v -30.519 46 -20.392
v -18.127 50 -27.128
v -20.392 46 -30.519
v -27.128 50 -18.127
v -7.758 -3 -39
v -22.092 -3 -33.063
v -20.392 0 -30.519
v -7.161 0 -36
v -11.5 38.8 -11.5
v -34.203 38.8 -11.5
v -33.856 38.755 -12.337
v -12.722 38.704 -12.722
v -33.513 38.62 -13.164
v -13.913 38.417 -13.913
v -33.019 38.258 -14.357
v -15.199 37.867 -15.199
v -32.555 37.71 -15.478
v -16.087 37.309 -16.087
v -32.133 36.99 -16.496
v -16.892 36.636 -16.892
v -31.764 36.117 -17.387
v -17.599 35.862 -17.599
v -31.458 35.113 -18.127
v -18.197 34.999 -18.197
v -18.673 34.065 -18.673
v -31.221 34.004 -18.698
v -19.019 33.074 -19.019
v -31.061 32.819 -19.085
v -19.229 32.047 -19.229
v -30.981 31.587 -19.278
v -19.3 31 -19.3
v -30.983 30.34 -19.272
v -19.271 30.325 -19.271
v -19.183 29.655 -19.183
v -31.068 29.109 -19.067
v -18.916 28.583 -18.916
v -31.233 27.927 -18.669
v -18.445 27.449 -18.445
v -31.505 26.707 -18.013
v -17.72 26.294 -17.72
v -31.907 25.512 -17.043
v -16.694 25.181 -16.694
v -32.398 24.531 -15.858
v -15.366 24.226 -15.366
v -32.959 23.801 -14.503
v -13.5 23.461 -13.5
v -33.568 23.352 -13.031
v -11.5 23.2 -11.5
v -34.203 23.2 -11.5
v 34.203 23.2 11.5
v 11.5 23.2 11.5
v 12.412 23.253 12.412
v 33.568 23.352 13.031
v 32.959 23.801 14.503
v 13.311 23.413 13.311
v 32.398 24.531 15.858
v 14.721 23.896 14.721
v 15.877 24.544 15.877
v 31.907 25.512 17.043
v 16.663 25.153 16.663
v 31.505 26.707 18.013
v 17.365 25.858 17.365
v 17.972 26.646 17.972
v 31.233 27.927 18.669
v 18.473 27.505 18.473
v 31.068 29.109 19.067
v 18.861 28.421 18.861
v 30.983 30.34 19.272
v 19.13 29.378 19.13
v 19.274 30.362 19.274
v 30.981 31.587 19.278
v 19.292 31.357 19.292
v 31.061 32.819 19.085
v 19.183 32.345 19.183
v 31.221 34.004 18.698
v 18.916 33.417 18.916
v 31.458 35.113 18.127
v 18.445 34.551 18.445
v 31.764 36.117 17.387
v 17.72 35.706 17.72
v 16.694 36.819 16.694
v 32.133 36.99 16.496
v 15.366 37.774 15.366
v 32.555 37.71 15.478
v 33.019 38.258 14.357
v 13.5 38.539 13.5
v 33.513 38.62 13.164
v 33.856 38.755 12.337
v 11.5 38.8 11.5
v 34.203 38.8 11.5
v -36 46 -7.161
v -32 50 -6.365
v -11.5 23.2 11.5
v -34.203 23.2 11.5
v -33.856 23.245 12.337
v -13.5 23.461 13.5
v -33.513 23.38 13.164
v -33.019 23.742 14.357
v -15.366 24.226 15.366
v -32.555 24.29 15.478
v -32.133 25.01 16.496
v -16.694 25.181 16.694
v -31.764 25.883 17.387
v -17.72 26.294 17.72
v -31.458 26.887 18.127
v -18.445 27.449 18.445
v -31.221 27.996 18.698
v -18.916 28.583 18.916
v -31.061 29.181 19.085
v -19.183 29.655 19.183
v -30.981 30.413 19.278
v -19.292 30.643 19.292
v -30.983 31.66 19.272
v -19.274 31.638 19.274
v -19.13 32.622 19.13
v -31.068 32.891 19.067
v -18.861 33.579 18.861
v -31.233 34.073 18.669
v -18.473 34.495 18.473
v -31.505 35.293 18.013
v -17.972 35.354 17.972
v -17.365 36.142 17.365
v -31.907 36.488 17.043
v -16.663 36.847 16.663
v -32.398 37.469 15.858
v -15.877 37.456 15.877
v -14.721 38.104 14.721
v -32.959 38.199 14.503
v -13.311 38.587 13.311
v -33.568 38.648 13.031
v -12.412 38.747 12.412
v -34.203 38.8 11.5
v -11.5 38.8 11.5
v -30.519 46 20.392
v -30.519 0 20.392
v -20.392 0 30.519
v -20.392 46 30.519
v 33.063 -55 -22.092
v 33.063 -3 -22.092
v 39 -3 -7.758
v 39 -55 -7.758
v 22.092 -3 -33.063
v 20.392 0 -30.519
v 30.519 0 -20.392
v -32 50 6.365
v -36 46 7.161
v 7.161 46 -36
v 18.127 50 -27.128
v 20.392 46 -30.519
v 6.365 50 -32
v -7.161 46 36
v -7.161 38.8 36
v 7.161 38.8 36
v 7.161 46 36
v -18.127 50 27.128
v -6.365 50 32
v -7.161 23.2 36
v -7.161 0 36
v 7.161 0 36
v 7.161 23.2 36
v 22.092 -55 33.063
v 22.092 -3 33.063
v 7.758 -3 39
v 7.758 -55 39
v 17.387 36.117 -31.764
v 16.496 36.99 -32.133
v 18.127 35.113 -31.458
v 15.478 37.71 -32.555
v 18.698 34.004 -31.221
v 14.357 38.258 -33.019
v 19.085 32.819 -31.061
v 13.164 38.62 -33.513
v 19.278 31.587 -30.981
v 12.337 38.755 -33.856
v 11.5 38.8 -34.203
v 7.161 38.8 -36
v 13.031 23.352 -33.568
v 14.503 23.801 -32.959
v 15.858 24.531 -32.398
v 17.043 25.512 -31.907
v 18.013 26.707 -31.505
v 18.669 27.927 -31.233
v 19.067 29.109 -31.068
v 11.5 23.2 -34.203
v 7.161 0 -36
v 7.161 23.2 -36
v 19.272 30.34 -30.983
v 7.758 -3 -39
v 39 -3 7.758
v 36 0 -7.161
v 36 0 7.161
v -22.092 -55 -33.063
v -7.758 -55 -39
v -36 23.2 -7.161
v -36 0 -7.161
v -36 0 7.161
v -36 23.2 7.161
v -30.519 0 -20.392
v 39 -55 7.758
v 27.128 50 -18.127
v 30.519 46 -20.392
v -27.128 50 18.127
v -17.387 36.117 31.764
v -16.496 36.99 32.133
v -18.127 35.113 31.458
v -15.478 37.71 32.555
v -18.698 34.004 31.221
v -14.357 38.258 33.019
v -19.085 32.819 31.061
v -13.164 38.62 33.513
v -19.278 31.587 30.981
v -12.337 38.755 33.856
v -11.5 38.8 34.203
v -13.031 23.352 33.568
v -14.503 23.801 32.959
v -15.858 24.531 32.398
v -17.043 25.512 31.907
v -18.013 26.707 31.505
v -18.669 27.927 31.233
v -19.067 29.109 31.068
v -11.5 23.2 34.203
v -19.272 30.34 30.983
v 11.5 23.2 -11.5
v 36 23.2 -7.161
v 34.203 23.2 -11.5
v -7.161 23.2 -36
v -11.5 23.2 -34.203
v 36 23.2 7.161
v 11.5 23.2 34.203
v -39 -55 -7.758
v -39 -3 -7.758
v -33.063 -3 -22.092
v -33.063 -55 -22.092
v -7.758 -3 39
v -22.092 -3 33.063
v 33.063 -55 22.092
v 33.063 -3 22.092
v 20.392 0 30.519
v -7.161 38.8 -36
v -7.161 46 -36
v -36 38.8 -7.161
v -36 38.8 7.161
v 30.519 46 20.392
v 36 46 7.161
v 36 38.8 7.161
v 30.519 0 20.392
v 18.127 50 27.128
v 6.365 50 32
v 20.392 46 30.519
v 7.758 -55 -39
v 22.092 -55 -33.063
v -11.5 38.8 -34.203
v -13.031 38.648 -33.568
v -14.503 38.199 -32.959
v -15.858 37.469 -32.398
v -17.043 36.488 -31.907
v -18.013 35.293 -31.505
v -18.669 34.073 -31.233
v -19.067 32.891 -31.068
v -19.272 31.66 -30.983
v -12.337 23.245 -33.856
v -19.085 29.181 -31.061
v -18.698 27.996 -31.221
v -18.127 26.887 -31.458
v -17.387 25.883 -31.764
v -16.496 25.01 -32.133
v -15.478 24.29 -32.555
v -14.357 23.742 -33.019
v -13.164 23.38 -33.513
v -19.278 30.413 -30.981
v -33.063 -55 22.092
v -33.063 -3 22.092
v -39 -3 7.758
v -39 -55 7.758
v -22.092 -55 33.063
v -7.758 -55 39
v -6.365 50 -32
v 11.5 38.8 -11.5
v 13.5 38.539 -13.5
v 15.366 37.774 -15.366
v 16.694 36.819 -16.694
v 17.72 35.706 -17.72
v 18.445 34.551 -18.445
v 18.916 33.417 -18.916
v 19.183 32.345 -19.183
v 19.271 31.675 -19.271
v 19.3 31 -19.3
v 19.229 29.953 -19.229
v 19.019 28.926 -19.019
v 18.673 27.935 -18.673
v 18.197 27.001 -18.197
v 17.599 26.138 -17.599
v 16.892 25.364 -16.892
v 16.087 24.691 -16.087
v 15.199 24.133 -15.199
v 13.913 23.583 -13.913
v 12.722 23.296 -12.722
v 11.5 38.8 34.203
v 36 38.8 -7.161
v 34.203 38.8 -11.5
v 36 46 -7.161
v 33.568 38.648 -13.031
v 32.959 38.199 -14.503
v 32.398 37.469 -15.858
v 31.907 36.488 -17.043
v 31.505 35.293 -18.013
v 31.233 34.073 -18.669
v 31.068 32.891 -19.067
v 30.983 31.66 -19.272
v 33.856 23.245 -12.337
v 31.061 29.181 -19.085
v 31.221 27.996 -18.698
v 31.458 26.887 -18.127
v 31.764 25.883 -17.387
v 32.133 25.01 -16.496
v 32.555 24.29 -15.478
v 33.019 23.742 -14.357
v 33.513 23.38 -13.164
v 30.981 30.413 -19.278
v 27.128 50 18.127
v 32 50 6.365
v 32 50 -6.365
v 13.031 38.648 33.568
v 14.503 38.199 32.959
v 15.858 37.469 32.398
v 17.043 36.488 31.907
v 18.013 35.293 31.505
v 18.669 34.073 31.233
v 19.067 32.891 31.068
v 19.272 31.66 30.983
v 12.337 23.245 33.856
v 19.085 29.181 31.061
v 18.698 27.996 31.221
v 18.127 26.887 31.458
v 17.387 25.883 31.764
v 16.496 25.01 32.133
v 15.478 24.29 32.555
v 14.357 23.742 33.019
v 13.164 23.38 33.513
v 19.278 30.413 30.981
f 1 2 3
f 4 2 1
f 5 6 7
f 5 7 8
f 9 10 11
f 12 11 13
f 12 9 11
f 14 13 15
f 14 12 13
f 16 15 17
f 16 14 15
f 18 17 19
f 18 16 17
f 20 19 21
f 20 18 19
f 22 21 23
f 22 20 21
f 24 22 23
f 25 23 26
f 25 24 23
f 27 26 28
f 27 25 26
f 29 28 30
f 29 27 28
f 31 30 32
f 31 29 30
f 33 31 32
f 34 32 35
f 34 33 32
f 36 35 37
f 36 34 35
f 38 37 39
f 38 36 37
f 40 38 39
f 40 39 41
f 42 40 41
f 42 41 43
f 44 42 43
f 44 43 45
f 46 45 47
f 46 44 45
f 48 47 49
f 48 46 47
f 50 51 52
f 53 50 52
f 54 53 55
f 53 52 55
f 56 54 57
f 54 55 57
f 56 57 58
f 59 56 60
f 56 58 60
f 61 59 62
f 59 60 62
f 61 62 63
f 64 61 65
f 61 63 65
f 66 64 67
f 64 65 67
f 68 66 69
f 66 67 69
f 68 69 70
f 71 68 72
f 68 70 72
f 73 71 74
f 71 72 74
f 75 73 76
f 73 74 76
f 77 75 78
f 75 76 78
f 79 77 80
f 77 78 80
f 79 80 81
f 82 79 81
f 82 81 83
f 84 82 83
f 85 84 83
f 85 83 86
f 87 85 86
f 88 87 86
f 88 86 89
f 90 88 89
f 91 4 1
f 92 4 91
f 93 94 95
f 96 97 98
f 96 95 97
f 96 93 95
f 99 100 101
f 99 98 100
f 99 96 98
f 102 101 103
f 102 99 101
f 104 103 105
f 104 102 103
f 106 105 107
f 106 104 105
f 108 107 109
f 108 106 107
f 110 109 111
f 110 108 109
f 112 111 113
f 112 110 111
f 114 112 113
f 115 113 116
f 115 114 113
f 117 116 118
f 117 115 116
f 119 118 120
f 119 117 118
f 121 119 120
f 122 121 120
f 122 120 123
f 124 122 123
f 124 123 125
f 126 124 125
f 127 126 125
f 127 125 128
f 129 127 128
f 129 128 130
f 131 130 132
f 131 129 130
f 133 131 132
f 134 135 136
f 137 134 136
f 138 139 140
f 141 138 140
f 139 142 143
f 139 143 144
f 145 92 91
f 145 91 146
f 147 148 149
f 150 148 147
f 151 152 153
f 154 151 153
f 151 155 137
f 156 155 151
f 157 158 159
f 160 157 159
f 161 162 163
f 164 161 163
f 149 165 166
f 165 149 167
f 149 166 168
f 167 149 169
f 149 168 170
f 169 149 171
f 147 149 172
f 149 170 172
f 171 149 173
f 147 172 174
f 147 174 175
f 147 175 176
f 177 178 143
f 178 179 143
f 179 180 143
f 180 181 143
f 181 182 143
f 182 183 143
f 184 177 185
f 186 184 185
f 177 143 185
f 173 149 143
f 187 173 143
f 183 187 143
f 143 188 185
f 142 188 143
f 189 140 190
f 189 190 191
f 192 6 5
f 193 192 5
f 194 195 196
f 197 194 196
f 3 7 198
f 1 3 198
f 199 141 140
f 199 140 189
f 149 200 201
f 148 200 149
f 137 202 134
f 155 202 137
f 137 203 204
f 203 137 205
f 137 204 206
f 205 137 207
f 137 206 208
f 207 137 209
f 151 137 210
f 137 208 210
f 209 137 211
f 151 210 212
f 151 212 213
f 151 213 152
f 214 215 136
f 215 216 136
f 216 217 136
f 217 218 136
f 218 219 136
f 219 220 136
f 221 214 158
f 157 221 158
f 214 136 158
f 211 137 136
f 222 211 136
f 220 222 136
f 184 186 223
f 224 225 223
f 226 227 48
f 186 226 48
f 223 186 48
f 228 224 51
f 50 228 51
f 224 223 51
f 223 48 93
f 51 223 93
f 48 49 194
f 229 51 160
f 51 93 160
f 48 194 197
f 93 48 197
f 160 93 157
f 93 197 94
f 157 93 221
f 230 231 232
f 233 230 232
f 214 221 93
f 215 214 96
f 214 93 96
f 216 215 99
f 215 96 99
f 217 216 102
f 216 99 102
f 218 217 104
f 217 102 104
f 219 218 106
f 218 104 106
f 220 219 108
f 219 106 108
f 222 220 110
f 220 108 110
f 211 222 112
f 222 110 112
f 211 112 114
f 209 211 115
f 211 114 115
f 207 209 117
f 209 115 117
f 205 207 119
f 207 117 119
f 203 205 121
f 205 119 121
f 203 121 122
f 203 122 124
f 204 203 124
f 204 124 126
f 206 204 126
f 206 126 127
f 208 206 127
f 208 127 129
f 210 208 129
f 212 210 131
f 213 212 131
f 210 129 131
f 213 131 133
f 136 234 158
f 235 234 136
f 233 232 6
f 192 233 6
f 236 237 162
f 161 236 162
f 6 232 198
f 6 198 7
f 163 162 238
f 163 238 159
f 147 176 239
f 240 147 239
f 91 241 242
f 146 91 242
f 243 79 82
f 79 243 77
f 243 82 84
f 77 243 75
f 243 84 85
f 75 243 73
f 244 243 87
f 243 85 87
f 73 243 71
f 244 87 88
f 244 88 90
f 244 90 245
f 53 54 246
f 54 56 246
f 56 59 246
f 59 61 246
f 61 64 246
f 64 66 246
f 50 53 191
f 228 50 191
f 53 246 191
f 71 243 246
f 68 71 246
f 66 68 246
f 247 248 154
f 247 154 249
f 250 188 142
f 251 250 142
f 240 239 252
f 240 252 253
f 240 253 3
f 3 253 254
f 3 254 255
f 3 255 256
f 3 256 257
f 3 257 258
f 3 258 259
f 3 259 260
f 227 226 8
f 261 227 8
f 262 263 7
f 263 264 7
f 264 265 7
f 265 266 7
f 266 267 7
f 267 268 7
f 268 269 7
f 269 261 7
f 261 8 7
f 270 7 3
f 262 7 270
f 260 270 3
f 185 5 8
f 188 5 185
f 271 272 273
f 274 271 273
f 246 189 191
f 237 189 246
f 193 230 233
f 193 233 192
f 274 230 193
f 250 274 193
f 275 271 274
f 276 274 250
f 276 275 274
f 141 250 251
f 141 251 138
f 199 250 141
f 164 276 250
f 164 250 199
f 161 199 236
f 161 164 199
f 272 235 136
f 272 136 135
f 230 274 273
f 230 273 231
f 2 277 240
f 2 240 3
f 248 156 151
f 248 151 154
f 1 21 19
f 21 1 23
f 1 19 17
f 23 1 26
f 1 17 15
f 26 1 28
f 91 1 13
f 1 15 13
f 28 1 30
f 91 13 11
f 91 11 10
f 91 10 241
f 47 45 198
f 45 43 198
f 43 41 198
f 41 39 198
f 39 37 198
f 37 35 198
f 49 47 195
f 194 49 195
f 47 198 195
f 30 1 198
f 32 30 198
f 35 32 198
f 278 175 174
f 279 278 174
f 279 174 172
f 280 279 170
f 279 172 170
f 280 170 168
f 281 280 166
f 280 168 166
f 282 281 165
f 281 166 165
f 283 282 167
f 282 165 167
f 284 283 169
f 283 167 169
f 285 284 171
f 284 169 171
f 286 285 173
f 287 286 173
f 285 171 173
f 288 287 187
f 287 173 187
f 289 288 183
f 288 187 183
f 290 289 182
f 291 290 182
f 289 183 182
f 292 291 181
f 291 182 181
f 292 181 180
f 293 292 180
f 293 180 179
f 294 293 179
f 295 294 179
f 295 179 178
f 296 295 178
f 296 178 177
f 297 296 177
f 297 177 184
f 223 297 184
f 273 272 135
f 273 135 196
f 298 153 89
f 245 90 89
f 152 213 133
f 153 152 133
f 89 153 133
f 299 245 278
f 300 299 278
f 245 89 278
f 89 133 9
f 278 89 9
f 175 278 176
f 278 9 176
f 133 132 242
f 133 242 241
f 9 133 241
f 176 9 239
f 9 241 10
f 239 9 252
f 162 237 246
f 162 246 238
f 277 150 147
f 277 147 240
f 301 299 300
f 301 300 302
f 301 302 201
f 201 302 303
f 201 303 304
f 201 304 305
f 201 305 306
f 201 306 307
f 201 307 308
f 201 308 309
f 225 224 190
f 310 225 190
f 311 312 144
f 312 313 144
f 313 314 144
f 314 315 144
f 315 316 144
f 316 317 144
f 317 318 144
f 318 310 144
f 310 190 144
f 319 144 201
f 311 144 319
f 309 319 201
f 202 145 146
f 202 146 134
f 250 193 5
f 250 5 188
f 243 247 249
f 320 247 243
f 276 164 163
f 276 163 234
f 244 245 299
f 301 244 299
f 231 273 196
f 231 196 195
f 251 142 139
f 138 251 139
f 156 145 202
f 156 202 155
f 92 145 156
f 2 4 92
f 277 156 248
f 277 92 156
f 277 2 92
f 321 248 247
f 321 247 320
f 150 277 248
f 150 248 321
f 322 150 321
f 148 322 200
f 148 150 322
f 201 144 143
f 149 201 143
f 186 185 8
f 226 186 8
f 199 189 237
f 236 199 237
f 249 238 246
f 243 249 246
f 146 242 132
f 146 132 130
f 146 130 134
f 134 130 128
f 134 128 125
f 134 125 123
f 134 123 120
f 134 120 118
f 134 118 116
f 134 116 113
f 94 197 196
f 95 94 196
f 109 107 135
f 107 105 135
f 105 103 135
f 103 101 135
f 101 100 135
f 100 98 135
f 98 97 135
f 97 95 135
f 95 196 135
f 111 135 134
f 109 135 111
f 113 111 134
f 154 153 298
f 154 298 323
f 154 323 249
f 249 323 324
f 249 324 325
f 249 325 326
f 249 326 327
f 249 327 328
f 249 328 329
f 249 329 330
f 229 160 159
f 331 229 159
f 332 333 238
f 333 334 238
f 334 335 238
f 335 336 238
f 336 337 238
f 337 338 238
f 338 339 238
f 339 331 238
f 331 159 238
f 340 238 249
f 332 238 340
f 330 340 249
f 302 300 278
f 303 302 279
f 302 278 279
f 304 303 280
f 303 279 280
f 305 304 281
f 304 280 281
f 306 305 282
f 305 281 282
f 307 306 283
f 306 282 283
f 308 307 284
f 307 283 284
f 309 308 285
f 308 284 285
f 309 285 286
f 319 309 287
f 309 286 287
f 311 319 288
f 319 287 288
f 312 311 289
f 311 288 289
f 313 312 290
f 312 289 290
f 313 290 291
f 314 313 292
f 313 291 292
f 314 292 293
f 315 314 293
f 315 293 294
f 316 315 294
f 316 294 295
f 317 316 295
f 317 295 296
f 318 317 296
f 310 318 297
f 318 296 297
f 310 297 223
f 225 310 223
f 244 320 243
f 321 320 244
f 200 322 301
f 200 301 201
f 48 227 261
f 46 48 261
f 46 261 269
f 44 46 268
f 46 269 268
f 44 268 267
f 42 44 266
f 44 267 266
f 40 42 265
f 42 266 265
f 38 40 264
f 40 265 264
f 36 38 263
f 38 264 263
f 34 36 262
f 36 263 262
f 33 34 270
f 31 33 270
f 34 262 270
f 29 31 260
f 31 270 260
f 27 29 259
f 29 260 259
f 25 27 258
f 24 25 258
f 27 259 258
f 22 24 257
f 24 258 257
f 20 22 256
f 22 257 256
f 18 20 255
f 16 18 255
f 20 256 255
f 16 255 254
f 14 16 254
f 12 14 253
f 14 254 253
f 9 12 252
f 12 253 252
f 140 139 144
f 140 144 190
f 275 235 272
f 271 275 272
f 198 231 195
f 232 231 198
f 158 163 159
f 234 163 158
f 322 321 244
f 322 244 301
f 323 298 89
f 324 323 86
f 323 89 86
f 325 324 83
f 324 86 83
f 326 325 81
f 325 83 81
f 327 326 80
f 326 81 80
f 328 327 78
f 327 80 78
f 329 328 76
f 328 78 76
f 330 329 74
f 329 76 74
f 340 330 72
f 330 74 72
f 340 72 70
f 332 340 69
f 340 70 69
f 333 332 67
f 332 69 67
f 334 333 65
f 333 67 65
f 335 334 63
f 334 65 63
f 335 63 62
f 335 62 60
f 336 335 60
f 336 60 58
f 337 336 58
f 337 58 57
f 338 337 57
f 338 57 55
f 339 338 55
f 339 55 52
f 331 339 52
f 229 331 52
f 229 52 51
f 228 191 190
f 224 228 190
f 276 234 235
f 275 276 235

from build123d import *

# Parameters (mm, degrees)
BOSS_EXTRUDE1_DEPTH            = 50
BOSS_EXTRUDE2_DEPTH            = 55
CHAMFER1_SIZE                  = 4
CHAMFER3_SIZE                  = 3
CUT_EXTRUDE1_REACH             = 79.891
CUT_EXTRUDE1_DIRECTION_2_REACH = 79.891
CUT_EXTRUDE2_REACH             = 79.891
CUT_EXTRUDE2_DIRECTION_2_REACH = 79.891


with BuildPart() as part:
    # Sketch1 → Boss-Extrude1 (new body)
    with BuildSketch(Plane(origin=(0, 0, 0), x_dir=(1, 0, 0), z_dir=(0, 1, 0))):
        Polygon((36, 7.160845226), (30.519326341, 20.392361905), (20.392361905, 30.519326341), (7.160845226, 36), (-7.160845226, 36), (-20.392361905, 30.519326341), (-30.519326341, 20.392361905), (-36, 7.160845226), (-36, -7.160845226), (-30.519326341, -20.392361905), (-20.392361905, -30.519326341), (-7.160845226, -36), (7.160845226, -36), (20.392361905, -30.519326341), (30.519326341, -20.392361905), (36, -7.160845226), align=None)
    extrude(amount=BOSS_EXTRUDE1_DEPTH)

    # Sketch2 → Boss-Extrude2 (add)
    with BuildSketch(Plane.XZ):
        Polygon((33.062603536, 22.091725397), (22.091725397, 33.062603536), (7.757582328, 39), (-7.757582328, 39), (-22.091725397, 33.062603536), (-33.062603536, 22.091725397), (-39, 7.757582328), (-39, -7.757582328), (-33.062603536, -22.091725397), (-22.091725397, -33.062603536), (-7.757582328, -39), (7.757582328, -39), (22.091725397, -33.062603536), (33.062603536, -22.091725397), (39, -7.757582328), (39, 7.757582328), align=None)
    extrude(amount=BOSS_EXTRUDE2_DEPTH)

    # Chamfer1
    chamfer1_edges = [part.edges().sort_by_distance(p)[0] for p in [
        (25.455844123, 50, -25.455844123),
        (13.776603565, 50, -33.25966317),
        (0, 50, -36),
        (-13.776603565, 50, -33.25966317),
        (-25.455844123, 50, -25.455844123),
        (-33.25966317, 50, -13.776603565),
        (-36, 50, 0),
        (-33.25966317, 50, 13.776603565),
        (-25.455844123, 50, 25.455844123),
        (-13.776603565, 50, 33.25966317),
        (36, 50, 0),
        (0, 50, 36),
        (13.776603565, 50, 33.25966317),
        (25.455844123, 50, 25.455844123),
        (33.25966317, 50, 13.776603565),
        (33.25966317, 50, -13.776603565),
    ]]
    chamfer(chamfer1_edges, length=CHAMFER1_SIZE)

    # Chamfer3
    chamfer3_edges = [part.edges().sort_by_distance(p)[0] for p in [
        (36.031301768, 0, 14.924653862),
        (27.577164466, 0, 27.577164466),
        (14.924653862, 0, 36.031301768),
        (0, 0, 39),
        (-14.924653862, 0, 36.031301768),
        (-27.577164466, 0, 27.577164466),
        (-36.031301768, 0, 14.924653862),
        (-39, 0, 0),
        (-36.031301768, 0, -14.924653862),
        (-27.577164466, 0, -27.577164466),
        (-14.924653862, 0, -36.031301768),
        (0, 0, -39),
        (14.924653862, 0, -36.031301768),
        (27.577164466, 0, -27.577164466),
        (36.031301768, 0, -14.924653862),
        (39, 0, 0),
    ]]
    chamfer(chamfer3_edges, length=CHAMFER3_SIZE - 0.0001)  # a hair under: the kernel refuses the full size

    # Cut-Extrude1: up to this face of the body (flat: up to its plane)
    cut_extrude1_end = Plane(part.part.faces().sort_by_distance((0, 23, -36))[0])
    # Sketch3 → Cut-Extrude1 (cut, up to the picked face)
    with BuildSketch(Plane.XY, mode=Mode.PRIVATE) as cut_extrude1_sk1:
        with BuildLine():
            Line((-11.5, 38.8), (11.5, 38.8))
            ThreePointArc((11.5, 38.8), (19.3, 31), (11.5, 23.2))
            Line((11.5, 23.2), (-11.5, 23.2))
            ThreePointArc((-11.5, 23.2), (-19.3, 31), (-11.5, 38.8))
        make_face()
    cut_extrude1_tool1 = split(extrude(cut_extrude1_sk1.sketch, amount=-CUT_EXTRUDE1_REACH, mode=Mode.PRIVATE), bisect_by=cut_extrude1_end, keep=Keep.BOTH, mode=Mode.PRIVATE)
    add(cut_extrude1_tool1.solids().sort_by(Axis((0, 31, 0), (0, 0, -1)))[0], mode=Mode.SUBTRACT)

    # Cut-Extrude1 direction 2: up to this face of the body (flat: up to its plane)
    cut_extrude1_direction_2_end = Plane(part.part.faces().sort_by_distance((0, 23, 36))[0])
    # Sketch3 → Cut-Extrude1 direction 2 (cut, up to the picked face)
    with BuildSketch(Plane.XY, mode=Mode.PRIVATE) as cut_extrude1_direction_2_sk1:
        with BuildLine():
            Line((-11.5, 38.8), (11.5, 38.8))
            ThreePointArc((11.5, 38.8), (19.3, 31), (11.5, 23.2))
            Line((11.5, 23.2), (-11.5, 23.2))
            ThreePointArc((-11.5, 23.2), (-19.3, 31), (-11.5, 38.8))
        make_face()
    cut_extrude1_direction_2_tool1 = split(extrude(cut_extrude1_direction_2_sk1.sketch, amount=CUT_EXTRUDE1_DIRECTION_2_REACH, mode=Mode.PRIVATE), bisect_by=cut_extrude1_direction_2_end, keep=Keep.BOTH, mode=Mode.PRIVATE)
    add(cut_extrude1_direction_2_tool1.solids().sort_by(Axis((0, 31, 0), (0, 0, 1)))[0], mode=Mode.SUBTRACT)

    # Cut-Extrude2: up to this face of the body (flat: up to its plane)
    cut_extrude2_end = Plane(part.part.faces().sort_by_distance((36, 23, 0))[0])
    # Sketch4 → Cut-Extrude2 (cut, up to the picked face)
    with BuildSketch(Plane(origin=(0, 0, 0), x_dir=(0, 0, -1), z_dir=(1, 0, 0)), mode=Mode.PRIVATE) as cut_extrude2_sk1:
        with BuildLine():
            Line((-11.5, 38.8), (11.5, 38.8))
            ThreePointArc((11.5, 38.8), (19.3, 31), (11.5, 23.2))
            Line((11.5, 23.2), (-11.5, 23.2))
            ThreePointArc((-11.5, 23.2), (-19.3, 31), (-11.5, 38.8))
        make_face()
    cut_extrude2_tool1 = split(extrude(cut_extrude2_sk1.sketch, amount=CUT_EXTRUDE2_REACH, mode=Mode.PRIVATE), bisect_by=cut_extrude2_end, keep=Keep.BOTH, mode=Mode.PRIVATE)
    add(cut_extrude2_tool1.solids().sort_by(Axis((0, 31, 0), (1, 0, 0)))[0], mode=Mode.SUBTRACT)

    # Cut-Extrude2 direction 2: up to this face of the body (flat: up to its plane)
    cut_extrude2_direction_2_end = Plane(part.part.faces().sort_by_distance((-36, 23, 0))[0])
    # Sketch4 → Cut-Extrude2 direction 2 (cut, up to the picked face)
    with BuildSketch(Plane(origin=(0, 0, 0), x_dir=(0, 0, -1), z_dir=(1, 0, 0)), mode=Mode.PRIVATE) as cut_extrude2_direction_2_sk1:
        with BuildLine():
            Line((-11.5, 38.8), (11.5, 38.8))
            ThreePointArc((11.5, 38.8), (19.3, 31), (11.5, 23.2))
            Line((11.5, 23.2), (-11.5, 23.2))
            ThreePointArc((-11.5, 23.2), (-19.3, 31), (-11.5, 38.8))
        make_face()
    cut_extrude2_direction_2_tool1 = split(extrude(cut_extrude2_direction_2_sk1.sketch, amount=-CUT_EXTRUDE2_DIRECTION_2_REACH, mode=Mode.PRIVATE), bisect_by=cut_extrude2_direction_2_end, keep=Keep.BOTH, mode=Mode.PRIVATE)
    add(cut_extrude2_direction_2_tool1.solids().sort_by(Axis((0, 31, 0), (-1, 0, 0)))[0], mode=Mode.SUBTRACT)


solid = part.part
